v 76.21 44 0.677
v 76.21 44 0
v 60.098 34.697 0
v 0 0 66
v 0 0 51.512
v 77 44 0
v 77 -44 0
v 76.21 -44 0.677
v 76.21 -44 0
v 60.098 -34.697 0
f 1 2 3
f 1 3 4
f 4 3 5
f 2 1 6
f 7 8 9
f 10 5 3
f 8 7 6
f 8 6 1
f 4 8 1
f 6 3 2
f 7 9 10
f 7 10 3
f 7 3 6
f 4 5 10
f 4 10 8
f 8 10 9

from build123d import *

# Parameters (mm, degrees)
F1_DEPTH = 33
F2_DEPTH = 44
F4_DEPTH = 66.001


with BuildPart() as f1:
    # F0 (on Front) → F1 (new body, symmetric)
    with BuildSketch(Plane.XZ):
        Polygon((77, 0), (0, 66), (0, 51.512144), (60.097502, 0), align=None)
    extrude(amount=F1_DEPTH, both=True)

    # F0 (on Front) → F2 (join, symmetric)
    with BuildSketch(Plane.XZ):
        Polygon((77, 0), (0, 66), (0, 51.512144), (60.097502, 0), align=None)
    extrude(amount=F2_DEPTH, both=True)

    # F3 (on Top) → F4 (intersect, through all)
    with BuildSketch(Plane.XY):
        Polygon((88.684835, -51.202213), (88.684835, 51.202213), (0, 0), align=None)
    extrude(amount=F4_DEPTH, mode=Mode.INTERSECT)


solid = f1.part
